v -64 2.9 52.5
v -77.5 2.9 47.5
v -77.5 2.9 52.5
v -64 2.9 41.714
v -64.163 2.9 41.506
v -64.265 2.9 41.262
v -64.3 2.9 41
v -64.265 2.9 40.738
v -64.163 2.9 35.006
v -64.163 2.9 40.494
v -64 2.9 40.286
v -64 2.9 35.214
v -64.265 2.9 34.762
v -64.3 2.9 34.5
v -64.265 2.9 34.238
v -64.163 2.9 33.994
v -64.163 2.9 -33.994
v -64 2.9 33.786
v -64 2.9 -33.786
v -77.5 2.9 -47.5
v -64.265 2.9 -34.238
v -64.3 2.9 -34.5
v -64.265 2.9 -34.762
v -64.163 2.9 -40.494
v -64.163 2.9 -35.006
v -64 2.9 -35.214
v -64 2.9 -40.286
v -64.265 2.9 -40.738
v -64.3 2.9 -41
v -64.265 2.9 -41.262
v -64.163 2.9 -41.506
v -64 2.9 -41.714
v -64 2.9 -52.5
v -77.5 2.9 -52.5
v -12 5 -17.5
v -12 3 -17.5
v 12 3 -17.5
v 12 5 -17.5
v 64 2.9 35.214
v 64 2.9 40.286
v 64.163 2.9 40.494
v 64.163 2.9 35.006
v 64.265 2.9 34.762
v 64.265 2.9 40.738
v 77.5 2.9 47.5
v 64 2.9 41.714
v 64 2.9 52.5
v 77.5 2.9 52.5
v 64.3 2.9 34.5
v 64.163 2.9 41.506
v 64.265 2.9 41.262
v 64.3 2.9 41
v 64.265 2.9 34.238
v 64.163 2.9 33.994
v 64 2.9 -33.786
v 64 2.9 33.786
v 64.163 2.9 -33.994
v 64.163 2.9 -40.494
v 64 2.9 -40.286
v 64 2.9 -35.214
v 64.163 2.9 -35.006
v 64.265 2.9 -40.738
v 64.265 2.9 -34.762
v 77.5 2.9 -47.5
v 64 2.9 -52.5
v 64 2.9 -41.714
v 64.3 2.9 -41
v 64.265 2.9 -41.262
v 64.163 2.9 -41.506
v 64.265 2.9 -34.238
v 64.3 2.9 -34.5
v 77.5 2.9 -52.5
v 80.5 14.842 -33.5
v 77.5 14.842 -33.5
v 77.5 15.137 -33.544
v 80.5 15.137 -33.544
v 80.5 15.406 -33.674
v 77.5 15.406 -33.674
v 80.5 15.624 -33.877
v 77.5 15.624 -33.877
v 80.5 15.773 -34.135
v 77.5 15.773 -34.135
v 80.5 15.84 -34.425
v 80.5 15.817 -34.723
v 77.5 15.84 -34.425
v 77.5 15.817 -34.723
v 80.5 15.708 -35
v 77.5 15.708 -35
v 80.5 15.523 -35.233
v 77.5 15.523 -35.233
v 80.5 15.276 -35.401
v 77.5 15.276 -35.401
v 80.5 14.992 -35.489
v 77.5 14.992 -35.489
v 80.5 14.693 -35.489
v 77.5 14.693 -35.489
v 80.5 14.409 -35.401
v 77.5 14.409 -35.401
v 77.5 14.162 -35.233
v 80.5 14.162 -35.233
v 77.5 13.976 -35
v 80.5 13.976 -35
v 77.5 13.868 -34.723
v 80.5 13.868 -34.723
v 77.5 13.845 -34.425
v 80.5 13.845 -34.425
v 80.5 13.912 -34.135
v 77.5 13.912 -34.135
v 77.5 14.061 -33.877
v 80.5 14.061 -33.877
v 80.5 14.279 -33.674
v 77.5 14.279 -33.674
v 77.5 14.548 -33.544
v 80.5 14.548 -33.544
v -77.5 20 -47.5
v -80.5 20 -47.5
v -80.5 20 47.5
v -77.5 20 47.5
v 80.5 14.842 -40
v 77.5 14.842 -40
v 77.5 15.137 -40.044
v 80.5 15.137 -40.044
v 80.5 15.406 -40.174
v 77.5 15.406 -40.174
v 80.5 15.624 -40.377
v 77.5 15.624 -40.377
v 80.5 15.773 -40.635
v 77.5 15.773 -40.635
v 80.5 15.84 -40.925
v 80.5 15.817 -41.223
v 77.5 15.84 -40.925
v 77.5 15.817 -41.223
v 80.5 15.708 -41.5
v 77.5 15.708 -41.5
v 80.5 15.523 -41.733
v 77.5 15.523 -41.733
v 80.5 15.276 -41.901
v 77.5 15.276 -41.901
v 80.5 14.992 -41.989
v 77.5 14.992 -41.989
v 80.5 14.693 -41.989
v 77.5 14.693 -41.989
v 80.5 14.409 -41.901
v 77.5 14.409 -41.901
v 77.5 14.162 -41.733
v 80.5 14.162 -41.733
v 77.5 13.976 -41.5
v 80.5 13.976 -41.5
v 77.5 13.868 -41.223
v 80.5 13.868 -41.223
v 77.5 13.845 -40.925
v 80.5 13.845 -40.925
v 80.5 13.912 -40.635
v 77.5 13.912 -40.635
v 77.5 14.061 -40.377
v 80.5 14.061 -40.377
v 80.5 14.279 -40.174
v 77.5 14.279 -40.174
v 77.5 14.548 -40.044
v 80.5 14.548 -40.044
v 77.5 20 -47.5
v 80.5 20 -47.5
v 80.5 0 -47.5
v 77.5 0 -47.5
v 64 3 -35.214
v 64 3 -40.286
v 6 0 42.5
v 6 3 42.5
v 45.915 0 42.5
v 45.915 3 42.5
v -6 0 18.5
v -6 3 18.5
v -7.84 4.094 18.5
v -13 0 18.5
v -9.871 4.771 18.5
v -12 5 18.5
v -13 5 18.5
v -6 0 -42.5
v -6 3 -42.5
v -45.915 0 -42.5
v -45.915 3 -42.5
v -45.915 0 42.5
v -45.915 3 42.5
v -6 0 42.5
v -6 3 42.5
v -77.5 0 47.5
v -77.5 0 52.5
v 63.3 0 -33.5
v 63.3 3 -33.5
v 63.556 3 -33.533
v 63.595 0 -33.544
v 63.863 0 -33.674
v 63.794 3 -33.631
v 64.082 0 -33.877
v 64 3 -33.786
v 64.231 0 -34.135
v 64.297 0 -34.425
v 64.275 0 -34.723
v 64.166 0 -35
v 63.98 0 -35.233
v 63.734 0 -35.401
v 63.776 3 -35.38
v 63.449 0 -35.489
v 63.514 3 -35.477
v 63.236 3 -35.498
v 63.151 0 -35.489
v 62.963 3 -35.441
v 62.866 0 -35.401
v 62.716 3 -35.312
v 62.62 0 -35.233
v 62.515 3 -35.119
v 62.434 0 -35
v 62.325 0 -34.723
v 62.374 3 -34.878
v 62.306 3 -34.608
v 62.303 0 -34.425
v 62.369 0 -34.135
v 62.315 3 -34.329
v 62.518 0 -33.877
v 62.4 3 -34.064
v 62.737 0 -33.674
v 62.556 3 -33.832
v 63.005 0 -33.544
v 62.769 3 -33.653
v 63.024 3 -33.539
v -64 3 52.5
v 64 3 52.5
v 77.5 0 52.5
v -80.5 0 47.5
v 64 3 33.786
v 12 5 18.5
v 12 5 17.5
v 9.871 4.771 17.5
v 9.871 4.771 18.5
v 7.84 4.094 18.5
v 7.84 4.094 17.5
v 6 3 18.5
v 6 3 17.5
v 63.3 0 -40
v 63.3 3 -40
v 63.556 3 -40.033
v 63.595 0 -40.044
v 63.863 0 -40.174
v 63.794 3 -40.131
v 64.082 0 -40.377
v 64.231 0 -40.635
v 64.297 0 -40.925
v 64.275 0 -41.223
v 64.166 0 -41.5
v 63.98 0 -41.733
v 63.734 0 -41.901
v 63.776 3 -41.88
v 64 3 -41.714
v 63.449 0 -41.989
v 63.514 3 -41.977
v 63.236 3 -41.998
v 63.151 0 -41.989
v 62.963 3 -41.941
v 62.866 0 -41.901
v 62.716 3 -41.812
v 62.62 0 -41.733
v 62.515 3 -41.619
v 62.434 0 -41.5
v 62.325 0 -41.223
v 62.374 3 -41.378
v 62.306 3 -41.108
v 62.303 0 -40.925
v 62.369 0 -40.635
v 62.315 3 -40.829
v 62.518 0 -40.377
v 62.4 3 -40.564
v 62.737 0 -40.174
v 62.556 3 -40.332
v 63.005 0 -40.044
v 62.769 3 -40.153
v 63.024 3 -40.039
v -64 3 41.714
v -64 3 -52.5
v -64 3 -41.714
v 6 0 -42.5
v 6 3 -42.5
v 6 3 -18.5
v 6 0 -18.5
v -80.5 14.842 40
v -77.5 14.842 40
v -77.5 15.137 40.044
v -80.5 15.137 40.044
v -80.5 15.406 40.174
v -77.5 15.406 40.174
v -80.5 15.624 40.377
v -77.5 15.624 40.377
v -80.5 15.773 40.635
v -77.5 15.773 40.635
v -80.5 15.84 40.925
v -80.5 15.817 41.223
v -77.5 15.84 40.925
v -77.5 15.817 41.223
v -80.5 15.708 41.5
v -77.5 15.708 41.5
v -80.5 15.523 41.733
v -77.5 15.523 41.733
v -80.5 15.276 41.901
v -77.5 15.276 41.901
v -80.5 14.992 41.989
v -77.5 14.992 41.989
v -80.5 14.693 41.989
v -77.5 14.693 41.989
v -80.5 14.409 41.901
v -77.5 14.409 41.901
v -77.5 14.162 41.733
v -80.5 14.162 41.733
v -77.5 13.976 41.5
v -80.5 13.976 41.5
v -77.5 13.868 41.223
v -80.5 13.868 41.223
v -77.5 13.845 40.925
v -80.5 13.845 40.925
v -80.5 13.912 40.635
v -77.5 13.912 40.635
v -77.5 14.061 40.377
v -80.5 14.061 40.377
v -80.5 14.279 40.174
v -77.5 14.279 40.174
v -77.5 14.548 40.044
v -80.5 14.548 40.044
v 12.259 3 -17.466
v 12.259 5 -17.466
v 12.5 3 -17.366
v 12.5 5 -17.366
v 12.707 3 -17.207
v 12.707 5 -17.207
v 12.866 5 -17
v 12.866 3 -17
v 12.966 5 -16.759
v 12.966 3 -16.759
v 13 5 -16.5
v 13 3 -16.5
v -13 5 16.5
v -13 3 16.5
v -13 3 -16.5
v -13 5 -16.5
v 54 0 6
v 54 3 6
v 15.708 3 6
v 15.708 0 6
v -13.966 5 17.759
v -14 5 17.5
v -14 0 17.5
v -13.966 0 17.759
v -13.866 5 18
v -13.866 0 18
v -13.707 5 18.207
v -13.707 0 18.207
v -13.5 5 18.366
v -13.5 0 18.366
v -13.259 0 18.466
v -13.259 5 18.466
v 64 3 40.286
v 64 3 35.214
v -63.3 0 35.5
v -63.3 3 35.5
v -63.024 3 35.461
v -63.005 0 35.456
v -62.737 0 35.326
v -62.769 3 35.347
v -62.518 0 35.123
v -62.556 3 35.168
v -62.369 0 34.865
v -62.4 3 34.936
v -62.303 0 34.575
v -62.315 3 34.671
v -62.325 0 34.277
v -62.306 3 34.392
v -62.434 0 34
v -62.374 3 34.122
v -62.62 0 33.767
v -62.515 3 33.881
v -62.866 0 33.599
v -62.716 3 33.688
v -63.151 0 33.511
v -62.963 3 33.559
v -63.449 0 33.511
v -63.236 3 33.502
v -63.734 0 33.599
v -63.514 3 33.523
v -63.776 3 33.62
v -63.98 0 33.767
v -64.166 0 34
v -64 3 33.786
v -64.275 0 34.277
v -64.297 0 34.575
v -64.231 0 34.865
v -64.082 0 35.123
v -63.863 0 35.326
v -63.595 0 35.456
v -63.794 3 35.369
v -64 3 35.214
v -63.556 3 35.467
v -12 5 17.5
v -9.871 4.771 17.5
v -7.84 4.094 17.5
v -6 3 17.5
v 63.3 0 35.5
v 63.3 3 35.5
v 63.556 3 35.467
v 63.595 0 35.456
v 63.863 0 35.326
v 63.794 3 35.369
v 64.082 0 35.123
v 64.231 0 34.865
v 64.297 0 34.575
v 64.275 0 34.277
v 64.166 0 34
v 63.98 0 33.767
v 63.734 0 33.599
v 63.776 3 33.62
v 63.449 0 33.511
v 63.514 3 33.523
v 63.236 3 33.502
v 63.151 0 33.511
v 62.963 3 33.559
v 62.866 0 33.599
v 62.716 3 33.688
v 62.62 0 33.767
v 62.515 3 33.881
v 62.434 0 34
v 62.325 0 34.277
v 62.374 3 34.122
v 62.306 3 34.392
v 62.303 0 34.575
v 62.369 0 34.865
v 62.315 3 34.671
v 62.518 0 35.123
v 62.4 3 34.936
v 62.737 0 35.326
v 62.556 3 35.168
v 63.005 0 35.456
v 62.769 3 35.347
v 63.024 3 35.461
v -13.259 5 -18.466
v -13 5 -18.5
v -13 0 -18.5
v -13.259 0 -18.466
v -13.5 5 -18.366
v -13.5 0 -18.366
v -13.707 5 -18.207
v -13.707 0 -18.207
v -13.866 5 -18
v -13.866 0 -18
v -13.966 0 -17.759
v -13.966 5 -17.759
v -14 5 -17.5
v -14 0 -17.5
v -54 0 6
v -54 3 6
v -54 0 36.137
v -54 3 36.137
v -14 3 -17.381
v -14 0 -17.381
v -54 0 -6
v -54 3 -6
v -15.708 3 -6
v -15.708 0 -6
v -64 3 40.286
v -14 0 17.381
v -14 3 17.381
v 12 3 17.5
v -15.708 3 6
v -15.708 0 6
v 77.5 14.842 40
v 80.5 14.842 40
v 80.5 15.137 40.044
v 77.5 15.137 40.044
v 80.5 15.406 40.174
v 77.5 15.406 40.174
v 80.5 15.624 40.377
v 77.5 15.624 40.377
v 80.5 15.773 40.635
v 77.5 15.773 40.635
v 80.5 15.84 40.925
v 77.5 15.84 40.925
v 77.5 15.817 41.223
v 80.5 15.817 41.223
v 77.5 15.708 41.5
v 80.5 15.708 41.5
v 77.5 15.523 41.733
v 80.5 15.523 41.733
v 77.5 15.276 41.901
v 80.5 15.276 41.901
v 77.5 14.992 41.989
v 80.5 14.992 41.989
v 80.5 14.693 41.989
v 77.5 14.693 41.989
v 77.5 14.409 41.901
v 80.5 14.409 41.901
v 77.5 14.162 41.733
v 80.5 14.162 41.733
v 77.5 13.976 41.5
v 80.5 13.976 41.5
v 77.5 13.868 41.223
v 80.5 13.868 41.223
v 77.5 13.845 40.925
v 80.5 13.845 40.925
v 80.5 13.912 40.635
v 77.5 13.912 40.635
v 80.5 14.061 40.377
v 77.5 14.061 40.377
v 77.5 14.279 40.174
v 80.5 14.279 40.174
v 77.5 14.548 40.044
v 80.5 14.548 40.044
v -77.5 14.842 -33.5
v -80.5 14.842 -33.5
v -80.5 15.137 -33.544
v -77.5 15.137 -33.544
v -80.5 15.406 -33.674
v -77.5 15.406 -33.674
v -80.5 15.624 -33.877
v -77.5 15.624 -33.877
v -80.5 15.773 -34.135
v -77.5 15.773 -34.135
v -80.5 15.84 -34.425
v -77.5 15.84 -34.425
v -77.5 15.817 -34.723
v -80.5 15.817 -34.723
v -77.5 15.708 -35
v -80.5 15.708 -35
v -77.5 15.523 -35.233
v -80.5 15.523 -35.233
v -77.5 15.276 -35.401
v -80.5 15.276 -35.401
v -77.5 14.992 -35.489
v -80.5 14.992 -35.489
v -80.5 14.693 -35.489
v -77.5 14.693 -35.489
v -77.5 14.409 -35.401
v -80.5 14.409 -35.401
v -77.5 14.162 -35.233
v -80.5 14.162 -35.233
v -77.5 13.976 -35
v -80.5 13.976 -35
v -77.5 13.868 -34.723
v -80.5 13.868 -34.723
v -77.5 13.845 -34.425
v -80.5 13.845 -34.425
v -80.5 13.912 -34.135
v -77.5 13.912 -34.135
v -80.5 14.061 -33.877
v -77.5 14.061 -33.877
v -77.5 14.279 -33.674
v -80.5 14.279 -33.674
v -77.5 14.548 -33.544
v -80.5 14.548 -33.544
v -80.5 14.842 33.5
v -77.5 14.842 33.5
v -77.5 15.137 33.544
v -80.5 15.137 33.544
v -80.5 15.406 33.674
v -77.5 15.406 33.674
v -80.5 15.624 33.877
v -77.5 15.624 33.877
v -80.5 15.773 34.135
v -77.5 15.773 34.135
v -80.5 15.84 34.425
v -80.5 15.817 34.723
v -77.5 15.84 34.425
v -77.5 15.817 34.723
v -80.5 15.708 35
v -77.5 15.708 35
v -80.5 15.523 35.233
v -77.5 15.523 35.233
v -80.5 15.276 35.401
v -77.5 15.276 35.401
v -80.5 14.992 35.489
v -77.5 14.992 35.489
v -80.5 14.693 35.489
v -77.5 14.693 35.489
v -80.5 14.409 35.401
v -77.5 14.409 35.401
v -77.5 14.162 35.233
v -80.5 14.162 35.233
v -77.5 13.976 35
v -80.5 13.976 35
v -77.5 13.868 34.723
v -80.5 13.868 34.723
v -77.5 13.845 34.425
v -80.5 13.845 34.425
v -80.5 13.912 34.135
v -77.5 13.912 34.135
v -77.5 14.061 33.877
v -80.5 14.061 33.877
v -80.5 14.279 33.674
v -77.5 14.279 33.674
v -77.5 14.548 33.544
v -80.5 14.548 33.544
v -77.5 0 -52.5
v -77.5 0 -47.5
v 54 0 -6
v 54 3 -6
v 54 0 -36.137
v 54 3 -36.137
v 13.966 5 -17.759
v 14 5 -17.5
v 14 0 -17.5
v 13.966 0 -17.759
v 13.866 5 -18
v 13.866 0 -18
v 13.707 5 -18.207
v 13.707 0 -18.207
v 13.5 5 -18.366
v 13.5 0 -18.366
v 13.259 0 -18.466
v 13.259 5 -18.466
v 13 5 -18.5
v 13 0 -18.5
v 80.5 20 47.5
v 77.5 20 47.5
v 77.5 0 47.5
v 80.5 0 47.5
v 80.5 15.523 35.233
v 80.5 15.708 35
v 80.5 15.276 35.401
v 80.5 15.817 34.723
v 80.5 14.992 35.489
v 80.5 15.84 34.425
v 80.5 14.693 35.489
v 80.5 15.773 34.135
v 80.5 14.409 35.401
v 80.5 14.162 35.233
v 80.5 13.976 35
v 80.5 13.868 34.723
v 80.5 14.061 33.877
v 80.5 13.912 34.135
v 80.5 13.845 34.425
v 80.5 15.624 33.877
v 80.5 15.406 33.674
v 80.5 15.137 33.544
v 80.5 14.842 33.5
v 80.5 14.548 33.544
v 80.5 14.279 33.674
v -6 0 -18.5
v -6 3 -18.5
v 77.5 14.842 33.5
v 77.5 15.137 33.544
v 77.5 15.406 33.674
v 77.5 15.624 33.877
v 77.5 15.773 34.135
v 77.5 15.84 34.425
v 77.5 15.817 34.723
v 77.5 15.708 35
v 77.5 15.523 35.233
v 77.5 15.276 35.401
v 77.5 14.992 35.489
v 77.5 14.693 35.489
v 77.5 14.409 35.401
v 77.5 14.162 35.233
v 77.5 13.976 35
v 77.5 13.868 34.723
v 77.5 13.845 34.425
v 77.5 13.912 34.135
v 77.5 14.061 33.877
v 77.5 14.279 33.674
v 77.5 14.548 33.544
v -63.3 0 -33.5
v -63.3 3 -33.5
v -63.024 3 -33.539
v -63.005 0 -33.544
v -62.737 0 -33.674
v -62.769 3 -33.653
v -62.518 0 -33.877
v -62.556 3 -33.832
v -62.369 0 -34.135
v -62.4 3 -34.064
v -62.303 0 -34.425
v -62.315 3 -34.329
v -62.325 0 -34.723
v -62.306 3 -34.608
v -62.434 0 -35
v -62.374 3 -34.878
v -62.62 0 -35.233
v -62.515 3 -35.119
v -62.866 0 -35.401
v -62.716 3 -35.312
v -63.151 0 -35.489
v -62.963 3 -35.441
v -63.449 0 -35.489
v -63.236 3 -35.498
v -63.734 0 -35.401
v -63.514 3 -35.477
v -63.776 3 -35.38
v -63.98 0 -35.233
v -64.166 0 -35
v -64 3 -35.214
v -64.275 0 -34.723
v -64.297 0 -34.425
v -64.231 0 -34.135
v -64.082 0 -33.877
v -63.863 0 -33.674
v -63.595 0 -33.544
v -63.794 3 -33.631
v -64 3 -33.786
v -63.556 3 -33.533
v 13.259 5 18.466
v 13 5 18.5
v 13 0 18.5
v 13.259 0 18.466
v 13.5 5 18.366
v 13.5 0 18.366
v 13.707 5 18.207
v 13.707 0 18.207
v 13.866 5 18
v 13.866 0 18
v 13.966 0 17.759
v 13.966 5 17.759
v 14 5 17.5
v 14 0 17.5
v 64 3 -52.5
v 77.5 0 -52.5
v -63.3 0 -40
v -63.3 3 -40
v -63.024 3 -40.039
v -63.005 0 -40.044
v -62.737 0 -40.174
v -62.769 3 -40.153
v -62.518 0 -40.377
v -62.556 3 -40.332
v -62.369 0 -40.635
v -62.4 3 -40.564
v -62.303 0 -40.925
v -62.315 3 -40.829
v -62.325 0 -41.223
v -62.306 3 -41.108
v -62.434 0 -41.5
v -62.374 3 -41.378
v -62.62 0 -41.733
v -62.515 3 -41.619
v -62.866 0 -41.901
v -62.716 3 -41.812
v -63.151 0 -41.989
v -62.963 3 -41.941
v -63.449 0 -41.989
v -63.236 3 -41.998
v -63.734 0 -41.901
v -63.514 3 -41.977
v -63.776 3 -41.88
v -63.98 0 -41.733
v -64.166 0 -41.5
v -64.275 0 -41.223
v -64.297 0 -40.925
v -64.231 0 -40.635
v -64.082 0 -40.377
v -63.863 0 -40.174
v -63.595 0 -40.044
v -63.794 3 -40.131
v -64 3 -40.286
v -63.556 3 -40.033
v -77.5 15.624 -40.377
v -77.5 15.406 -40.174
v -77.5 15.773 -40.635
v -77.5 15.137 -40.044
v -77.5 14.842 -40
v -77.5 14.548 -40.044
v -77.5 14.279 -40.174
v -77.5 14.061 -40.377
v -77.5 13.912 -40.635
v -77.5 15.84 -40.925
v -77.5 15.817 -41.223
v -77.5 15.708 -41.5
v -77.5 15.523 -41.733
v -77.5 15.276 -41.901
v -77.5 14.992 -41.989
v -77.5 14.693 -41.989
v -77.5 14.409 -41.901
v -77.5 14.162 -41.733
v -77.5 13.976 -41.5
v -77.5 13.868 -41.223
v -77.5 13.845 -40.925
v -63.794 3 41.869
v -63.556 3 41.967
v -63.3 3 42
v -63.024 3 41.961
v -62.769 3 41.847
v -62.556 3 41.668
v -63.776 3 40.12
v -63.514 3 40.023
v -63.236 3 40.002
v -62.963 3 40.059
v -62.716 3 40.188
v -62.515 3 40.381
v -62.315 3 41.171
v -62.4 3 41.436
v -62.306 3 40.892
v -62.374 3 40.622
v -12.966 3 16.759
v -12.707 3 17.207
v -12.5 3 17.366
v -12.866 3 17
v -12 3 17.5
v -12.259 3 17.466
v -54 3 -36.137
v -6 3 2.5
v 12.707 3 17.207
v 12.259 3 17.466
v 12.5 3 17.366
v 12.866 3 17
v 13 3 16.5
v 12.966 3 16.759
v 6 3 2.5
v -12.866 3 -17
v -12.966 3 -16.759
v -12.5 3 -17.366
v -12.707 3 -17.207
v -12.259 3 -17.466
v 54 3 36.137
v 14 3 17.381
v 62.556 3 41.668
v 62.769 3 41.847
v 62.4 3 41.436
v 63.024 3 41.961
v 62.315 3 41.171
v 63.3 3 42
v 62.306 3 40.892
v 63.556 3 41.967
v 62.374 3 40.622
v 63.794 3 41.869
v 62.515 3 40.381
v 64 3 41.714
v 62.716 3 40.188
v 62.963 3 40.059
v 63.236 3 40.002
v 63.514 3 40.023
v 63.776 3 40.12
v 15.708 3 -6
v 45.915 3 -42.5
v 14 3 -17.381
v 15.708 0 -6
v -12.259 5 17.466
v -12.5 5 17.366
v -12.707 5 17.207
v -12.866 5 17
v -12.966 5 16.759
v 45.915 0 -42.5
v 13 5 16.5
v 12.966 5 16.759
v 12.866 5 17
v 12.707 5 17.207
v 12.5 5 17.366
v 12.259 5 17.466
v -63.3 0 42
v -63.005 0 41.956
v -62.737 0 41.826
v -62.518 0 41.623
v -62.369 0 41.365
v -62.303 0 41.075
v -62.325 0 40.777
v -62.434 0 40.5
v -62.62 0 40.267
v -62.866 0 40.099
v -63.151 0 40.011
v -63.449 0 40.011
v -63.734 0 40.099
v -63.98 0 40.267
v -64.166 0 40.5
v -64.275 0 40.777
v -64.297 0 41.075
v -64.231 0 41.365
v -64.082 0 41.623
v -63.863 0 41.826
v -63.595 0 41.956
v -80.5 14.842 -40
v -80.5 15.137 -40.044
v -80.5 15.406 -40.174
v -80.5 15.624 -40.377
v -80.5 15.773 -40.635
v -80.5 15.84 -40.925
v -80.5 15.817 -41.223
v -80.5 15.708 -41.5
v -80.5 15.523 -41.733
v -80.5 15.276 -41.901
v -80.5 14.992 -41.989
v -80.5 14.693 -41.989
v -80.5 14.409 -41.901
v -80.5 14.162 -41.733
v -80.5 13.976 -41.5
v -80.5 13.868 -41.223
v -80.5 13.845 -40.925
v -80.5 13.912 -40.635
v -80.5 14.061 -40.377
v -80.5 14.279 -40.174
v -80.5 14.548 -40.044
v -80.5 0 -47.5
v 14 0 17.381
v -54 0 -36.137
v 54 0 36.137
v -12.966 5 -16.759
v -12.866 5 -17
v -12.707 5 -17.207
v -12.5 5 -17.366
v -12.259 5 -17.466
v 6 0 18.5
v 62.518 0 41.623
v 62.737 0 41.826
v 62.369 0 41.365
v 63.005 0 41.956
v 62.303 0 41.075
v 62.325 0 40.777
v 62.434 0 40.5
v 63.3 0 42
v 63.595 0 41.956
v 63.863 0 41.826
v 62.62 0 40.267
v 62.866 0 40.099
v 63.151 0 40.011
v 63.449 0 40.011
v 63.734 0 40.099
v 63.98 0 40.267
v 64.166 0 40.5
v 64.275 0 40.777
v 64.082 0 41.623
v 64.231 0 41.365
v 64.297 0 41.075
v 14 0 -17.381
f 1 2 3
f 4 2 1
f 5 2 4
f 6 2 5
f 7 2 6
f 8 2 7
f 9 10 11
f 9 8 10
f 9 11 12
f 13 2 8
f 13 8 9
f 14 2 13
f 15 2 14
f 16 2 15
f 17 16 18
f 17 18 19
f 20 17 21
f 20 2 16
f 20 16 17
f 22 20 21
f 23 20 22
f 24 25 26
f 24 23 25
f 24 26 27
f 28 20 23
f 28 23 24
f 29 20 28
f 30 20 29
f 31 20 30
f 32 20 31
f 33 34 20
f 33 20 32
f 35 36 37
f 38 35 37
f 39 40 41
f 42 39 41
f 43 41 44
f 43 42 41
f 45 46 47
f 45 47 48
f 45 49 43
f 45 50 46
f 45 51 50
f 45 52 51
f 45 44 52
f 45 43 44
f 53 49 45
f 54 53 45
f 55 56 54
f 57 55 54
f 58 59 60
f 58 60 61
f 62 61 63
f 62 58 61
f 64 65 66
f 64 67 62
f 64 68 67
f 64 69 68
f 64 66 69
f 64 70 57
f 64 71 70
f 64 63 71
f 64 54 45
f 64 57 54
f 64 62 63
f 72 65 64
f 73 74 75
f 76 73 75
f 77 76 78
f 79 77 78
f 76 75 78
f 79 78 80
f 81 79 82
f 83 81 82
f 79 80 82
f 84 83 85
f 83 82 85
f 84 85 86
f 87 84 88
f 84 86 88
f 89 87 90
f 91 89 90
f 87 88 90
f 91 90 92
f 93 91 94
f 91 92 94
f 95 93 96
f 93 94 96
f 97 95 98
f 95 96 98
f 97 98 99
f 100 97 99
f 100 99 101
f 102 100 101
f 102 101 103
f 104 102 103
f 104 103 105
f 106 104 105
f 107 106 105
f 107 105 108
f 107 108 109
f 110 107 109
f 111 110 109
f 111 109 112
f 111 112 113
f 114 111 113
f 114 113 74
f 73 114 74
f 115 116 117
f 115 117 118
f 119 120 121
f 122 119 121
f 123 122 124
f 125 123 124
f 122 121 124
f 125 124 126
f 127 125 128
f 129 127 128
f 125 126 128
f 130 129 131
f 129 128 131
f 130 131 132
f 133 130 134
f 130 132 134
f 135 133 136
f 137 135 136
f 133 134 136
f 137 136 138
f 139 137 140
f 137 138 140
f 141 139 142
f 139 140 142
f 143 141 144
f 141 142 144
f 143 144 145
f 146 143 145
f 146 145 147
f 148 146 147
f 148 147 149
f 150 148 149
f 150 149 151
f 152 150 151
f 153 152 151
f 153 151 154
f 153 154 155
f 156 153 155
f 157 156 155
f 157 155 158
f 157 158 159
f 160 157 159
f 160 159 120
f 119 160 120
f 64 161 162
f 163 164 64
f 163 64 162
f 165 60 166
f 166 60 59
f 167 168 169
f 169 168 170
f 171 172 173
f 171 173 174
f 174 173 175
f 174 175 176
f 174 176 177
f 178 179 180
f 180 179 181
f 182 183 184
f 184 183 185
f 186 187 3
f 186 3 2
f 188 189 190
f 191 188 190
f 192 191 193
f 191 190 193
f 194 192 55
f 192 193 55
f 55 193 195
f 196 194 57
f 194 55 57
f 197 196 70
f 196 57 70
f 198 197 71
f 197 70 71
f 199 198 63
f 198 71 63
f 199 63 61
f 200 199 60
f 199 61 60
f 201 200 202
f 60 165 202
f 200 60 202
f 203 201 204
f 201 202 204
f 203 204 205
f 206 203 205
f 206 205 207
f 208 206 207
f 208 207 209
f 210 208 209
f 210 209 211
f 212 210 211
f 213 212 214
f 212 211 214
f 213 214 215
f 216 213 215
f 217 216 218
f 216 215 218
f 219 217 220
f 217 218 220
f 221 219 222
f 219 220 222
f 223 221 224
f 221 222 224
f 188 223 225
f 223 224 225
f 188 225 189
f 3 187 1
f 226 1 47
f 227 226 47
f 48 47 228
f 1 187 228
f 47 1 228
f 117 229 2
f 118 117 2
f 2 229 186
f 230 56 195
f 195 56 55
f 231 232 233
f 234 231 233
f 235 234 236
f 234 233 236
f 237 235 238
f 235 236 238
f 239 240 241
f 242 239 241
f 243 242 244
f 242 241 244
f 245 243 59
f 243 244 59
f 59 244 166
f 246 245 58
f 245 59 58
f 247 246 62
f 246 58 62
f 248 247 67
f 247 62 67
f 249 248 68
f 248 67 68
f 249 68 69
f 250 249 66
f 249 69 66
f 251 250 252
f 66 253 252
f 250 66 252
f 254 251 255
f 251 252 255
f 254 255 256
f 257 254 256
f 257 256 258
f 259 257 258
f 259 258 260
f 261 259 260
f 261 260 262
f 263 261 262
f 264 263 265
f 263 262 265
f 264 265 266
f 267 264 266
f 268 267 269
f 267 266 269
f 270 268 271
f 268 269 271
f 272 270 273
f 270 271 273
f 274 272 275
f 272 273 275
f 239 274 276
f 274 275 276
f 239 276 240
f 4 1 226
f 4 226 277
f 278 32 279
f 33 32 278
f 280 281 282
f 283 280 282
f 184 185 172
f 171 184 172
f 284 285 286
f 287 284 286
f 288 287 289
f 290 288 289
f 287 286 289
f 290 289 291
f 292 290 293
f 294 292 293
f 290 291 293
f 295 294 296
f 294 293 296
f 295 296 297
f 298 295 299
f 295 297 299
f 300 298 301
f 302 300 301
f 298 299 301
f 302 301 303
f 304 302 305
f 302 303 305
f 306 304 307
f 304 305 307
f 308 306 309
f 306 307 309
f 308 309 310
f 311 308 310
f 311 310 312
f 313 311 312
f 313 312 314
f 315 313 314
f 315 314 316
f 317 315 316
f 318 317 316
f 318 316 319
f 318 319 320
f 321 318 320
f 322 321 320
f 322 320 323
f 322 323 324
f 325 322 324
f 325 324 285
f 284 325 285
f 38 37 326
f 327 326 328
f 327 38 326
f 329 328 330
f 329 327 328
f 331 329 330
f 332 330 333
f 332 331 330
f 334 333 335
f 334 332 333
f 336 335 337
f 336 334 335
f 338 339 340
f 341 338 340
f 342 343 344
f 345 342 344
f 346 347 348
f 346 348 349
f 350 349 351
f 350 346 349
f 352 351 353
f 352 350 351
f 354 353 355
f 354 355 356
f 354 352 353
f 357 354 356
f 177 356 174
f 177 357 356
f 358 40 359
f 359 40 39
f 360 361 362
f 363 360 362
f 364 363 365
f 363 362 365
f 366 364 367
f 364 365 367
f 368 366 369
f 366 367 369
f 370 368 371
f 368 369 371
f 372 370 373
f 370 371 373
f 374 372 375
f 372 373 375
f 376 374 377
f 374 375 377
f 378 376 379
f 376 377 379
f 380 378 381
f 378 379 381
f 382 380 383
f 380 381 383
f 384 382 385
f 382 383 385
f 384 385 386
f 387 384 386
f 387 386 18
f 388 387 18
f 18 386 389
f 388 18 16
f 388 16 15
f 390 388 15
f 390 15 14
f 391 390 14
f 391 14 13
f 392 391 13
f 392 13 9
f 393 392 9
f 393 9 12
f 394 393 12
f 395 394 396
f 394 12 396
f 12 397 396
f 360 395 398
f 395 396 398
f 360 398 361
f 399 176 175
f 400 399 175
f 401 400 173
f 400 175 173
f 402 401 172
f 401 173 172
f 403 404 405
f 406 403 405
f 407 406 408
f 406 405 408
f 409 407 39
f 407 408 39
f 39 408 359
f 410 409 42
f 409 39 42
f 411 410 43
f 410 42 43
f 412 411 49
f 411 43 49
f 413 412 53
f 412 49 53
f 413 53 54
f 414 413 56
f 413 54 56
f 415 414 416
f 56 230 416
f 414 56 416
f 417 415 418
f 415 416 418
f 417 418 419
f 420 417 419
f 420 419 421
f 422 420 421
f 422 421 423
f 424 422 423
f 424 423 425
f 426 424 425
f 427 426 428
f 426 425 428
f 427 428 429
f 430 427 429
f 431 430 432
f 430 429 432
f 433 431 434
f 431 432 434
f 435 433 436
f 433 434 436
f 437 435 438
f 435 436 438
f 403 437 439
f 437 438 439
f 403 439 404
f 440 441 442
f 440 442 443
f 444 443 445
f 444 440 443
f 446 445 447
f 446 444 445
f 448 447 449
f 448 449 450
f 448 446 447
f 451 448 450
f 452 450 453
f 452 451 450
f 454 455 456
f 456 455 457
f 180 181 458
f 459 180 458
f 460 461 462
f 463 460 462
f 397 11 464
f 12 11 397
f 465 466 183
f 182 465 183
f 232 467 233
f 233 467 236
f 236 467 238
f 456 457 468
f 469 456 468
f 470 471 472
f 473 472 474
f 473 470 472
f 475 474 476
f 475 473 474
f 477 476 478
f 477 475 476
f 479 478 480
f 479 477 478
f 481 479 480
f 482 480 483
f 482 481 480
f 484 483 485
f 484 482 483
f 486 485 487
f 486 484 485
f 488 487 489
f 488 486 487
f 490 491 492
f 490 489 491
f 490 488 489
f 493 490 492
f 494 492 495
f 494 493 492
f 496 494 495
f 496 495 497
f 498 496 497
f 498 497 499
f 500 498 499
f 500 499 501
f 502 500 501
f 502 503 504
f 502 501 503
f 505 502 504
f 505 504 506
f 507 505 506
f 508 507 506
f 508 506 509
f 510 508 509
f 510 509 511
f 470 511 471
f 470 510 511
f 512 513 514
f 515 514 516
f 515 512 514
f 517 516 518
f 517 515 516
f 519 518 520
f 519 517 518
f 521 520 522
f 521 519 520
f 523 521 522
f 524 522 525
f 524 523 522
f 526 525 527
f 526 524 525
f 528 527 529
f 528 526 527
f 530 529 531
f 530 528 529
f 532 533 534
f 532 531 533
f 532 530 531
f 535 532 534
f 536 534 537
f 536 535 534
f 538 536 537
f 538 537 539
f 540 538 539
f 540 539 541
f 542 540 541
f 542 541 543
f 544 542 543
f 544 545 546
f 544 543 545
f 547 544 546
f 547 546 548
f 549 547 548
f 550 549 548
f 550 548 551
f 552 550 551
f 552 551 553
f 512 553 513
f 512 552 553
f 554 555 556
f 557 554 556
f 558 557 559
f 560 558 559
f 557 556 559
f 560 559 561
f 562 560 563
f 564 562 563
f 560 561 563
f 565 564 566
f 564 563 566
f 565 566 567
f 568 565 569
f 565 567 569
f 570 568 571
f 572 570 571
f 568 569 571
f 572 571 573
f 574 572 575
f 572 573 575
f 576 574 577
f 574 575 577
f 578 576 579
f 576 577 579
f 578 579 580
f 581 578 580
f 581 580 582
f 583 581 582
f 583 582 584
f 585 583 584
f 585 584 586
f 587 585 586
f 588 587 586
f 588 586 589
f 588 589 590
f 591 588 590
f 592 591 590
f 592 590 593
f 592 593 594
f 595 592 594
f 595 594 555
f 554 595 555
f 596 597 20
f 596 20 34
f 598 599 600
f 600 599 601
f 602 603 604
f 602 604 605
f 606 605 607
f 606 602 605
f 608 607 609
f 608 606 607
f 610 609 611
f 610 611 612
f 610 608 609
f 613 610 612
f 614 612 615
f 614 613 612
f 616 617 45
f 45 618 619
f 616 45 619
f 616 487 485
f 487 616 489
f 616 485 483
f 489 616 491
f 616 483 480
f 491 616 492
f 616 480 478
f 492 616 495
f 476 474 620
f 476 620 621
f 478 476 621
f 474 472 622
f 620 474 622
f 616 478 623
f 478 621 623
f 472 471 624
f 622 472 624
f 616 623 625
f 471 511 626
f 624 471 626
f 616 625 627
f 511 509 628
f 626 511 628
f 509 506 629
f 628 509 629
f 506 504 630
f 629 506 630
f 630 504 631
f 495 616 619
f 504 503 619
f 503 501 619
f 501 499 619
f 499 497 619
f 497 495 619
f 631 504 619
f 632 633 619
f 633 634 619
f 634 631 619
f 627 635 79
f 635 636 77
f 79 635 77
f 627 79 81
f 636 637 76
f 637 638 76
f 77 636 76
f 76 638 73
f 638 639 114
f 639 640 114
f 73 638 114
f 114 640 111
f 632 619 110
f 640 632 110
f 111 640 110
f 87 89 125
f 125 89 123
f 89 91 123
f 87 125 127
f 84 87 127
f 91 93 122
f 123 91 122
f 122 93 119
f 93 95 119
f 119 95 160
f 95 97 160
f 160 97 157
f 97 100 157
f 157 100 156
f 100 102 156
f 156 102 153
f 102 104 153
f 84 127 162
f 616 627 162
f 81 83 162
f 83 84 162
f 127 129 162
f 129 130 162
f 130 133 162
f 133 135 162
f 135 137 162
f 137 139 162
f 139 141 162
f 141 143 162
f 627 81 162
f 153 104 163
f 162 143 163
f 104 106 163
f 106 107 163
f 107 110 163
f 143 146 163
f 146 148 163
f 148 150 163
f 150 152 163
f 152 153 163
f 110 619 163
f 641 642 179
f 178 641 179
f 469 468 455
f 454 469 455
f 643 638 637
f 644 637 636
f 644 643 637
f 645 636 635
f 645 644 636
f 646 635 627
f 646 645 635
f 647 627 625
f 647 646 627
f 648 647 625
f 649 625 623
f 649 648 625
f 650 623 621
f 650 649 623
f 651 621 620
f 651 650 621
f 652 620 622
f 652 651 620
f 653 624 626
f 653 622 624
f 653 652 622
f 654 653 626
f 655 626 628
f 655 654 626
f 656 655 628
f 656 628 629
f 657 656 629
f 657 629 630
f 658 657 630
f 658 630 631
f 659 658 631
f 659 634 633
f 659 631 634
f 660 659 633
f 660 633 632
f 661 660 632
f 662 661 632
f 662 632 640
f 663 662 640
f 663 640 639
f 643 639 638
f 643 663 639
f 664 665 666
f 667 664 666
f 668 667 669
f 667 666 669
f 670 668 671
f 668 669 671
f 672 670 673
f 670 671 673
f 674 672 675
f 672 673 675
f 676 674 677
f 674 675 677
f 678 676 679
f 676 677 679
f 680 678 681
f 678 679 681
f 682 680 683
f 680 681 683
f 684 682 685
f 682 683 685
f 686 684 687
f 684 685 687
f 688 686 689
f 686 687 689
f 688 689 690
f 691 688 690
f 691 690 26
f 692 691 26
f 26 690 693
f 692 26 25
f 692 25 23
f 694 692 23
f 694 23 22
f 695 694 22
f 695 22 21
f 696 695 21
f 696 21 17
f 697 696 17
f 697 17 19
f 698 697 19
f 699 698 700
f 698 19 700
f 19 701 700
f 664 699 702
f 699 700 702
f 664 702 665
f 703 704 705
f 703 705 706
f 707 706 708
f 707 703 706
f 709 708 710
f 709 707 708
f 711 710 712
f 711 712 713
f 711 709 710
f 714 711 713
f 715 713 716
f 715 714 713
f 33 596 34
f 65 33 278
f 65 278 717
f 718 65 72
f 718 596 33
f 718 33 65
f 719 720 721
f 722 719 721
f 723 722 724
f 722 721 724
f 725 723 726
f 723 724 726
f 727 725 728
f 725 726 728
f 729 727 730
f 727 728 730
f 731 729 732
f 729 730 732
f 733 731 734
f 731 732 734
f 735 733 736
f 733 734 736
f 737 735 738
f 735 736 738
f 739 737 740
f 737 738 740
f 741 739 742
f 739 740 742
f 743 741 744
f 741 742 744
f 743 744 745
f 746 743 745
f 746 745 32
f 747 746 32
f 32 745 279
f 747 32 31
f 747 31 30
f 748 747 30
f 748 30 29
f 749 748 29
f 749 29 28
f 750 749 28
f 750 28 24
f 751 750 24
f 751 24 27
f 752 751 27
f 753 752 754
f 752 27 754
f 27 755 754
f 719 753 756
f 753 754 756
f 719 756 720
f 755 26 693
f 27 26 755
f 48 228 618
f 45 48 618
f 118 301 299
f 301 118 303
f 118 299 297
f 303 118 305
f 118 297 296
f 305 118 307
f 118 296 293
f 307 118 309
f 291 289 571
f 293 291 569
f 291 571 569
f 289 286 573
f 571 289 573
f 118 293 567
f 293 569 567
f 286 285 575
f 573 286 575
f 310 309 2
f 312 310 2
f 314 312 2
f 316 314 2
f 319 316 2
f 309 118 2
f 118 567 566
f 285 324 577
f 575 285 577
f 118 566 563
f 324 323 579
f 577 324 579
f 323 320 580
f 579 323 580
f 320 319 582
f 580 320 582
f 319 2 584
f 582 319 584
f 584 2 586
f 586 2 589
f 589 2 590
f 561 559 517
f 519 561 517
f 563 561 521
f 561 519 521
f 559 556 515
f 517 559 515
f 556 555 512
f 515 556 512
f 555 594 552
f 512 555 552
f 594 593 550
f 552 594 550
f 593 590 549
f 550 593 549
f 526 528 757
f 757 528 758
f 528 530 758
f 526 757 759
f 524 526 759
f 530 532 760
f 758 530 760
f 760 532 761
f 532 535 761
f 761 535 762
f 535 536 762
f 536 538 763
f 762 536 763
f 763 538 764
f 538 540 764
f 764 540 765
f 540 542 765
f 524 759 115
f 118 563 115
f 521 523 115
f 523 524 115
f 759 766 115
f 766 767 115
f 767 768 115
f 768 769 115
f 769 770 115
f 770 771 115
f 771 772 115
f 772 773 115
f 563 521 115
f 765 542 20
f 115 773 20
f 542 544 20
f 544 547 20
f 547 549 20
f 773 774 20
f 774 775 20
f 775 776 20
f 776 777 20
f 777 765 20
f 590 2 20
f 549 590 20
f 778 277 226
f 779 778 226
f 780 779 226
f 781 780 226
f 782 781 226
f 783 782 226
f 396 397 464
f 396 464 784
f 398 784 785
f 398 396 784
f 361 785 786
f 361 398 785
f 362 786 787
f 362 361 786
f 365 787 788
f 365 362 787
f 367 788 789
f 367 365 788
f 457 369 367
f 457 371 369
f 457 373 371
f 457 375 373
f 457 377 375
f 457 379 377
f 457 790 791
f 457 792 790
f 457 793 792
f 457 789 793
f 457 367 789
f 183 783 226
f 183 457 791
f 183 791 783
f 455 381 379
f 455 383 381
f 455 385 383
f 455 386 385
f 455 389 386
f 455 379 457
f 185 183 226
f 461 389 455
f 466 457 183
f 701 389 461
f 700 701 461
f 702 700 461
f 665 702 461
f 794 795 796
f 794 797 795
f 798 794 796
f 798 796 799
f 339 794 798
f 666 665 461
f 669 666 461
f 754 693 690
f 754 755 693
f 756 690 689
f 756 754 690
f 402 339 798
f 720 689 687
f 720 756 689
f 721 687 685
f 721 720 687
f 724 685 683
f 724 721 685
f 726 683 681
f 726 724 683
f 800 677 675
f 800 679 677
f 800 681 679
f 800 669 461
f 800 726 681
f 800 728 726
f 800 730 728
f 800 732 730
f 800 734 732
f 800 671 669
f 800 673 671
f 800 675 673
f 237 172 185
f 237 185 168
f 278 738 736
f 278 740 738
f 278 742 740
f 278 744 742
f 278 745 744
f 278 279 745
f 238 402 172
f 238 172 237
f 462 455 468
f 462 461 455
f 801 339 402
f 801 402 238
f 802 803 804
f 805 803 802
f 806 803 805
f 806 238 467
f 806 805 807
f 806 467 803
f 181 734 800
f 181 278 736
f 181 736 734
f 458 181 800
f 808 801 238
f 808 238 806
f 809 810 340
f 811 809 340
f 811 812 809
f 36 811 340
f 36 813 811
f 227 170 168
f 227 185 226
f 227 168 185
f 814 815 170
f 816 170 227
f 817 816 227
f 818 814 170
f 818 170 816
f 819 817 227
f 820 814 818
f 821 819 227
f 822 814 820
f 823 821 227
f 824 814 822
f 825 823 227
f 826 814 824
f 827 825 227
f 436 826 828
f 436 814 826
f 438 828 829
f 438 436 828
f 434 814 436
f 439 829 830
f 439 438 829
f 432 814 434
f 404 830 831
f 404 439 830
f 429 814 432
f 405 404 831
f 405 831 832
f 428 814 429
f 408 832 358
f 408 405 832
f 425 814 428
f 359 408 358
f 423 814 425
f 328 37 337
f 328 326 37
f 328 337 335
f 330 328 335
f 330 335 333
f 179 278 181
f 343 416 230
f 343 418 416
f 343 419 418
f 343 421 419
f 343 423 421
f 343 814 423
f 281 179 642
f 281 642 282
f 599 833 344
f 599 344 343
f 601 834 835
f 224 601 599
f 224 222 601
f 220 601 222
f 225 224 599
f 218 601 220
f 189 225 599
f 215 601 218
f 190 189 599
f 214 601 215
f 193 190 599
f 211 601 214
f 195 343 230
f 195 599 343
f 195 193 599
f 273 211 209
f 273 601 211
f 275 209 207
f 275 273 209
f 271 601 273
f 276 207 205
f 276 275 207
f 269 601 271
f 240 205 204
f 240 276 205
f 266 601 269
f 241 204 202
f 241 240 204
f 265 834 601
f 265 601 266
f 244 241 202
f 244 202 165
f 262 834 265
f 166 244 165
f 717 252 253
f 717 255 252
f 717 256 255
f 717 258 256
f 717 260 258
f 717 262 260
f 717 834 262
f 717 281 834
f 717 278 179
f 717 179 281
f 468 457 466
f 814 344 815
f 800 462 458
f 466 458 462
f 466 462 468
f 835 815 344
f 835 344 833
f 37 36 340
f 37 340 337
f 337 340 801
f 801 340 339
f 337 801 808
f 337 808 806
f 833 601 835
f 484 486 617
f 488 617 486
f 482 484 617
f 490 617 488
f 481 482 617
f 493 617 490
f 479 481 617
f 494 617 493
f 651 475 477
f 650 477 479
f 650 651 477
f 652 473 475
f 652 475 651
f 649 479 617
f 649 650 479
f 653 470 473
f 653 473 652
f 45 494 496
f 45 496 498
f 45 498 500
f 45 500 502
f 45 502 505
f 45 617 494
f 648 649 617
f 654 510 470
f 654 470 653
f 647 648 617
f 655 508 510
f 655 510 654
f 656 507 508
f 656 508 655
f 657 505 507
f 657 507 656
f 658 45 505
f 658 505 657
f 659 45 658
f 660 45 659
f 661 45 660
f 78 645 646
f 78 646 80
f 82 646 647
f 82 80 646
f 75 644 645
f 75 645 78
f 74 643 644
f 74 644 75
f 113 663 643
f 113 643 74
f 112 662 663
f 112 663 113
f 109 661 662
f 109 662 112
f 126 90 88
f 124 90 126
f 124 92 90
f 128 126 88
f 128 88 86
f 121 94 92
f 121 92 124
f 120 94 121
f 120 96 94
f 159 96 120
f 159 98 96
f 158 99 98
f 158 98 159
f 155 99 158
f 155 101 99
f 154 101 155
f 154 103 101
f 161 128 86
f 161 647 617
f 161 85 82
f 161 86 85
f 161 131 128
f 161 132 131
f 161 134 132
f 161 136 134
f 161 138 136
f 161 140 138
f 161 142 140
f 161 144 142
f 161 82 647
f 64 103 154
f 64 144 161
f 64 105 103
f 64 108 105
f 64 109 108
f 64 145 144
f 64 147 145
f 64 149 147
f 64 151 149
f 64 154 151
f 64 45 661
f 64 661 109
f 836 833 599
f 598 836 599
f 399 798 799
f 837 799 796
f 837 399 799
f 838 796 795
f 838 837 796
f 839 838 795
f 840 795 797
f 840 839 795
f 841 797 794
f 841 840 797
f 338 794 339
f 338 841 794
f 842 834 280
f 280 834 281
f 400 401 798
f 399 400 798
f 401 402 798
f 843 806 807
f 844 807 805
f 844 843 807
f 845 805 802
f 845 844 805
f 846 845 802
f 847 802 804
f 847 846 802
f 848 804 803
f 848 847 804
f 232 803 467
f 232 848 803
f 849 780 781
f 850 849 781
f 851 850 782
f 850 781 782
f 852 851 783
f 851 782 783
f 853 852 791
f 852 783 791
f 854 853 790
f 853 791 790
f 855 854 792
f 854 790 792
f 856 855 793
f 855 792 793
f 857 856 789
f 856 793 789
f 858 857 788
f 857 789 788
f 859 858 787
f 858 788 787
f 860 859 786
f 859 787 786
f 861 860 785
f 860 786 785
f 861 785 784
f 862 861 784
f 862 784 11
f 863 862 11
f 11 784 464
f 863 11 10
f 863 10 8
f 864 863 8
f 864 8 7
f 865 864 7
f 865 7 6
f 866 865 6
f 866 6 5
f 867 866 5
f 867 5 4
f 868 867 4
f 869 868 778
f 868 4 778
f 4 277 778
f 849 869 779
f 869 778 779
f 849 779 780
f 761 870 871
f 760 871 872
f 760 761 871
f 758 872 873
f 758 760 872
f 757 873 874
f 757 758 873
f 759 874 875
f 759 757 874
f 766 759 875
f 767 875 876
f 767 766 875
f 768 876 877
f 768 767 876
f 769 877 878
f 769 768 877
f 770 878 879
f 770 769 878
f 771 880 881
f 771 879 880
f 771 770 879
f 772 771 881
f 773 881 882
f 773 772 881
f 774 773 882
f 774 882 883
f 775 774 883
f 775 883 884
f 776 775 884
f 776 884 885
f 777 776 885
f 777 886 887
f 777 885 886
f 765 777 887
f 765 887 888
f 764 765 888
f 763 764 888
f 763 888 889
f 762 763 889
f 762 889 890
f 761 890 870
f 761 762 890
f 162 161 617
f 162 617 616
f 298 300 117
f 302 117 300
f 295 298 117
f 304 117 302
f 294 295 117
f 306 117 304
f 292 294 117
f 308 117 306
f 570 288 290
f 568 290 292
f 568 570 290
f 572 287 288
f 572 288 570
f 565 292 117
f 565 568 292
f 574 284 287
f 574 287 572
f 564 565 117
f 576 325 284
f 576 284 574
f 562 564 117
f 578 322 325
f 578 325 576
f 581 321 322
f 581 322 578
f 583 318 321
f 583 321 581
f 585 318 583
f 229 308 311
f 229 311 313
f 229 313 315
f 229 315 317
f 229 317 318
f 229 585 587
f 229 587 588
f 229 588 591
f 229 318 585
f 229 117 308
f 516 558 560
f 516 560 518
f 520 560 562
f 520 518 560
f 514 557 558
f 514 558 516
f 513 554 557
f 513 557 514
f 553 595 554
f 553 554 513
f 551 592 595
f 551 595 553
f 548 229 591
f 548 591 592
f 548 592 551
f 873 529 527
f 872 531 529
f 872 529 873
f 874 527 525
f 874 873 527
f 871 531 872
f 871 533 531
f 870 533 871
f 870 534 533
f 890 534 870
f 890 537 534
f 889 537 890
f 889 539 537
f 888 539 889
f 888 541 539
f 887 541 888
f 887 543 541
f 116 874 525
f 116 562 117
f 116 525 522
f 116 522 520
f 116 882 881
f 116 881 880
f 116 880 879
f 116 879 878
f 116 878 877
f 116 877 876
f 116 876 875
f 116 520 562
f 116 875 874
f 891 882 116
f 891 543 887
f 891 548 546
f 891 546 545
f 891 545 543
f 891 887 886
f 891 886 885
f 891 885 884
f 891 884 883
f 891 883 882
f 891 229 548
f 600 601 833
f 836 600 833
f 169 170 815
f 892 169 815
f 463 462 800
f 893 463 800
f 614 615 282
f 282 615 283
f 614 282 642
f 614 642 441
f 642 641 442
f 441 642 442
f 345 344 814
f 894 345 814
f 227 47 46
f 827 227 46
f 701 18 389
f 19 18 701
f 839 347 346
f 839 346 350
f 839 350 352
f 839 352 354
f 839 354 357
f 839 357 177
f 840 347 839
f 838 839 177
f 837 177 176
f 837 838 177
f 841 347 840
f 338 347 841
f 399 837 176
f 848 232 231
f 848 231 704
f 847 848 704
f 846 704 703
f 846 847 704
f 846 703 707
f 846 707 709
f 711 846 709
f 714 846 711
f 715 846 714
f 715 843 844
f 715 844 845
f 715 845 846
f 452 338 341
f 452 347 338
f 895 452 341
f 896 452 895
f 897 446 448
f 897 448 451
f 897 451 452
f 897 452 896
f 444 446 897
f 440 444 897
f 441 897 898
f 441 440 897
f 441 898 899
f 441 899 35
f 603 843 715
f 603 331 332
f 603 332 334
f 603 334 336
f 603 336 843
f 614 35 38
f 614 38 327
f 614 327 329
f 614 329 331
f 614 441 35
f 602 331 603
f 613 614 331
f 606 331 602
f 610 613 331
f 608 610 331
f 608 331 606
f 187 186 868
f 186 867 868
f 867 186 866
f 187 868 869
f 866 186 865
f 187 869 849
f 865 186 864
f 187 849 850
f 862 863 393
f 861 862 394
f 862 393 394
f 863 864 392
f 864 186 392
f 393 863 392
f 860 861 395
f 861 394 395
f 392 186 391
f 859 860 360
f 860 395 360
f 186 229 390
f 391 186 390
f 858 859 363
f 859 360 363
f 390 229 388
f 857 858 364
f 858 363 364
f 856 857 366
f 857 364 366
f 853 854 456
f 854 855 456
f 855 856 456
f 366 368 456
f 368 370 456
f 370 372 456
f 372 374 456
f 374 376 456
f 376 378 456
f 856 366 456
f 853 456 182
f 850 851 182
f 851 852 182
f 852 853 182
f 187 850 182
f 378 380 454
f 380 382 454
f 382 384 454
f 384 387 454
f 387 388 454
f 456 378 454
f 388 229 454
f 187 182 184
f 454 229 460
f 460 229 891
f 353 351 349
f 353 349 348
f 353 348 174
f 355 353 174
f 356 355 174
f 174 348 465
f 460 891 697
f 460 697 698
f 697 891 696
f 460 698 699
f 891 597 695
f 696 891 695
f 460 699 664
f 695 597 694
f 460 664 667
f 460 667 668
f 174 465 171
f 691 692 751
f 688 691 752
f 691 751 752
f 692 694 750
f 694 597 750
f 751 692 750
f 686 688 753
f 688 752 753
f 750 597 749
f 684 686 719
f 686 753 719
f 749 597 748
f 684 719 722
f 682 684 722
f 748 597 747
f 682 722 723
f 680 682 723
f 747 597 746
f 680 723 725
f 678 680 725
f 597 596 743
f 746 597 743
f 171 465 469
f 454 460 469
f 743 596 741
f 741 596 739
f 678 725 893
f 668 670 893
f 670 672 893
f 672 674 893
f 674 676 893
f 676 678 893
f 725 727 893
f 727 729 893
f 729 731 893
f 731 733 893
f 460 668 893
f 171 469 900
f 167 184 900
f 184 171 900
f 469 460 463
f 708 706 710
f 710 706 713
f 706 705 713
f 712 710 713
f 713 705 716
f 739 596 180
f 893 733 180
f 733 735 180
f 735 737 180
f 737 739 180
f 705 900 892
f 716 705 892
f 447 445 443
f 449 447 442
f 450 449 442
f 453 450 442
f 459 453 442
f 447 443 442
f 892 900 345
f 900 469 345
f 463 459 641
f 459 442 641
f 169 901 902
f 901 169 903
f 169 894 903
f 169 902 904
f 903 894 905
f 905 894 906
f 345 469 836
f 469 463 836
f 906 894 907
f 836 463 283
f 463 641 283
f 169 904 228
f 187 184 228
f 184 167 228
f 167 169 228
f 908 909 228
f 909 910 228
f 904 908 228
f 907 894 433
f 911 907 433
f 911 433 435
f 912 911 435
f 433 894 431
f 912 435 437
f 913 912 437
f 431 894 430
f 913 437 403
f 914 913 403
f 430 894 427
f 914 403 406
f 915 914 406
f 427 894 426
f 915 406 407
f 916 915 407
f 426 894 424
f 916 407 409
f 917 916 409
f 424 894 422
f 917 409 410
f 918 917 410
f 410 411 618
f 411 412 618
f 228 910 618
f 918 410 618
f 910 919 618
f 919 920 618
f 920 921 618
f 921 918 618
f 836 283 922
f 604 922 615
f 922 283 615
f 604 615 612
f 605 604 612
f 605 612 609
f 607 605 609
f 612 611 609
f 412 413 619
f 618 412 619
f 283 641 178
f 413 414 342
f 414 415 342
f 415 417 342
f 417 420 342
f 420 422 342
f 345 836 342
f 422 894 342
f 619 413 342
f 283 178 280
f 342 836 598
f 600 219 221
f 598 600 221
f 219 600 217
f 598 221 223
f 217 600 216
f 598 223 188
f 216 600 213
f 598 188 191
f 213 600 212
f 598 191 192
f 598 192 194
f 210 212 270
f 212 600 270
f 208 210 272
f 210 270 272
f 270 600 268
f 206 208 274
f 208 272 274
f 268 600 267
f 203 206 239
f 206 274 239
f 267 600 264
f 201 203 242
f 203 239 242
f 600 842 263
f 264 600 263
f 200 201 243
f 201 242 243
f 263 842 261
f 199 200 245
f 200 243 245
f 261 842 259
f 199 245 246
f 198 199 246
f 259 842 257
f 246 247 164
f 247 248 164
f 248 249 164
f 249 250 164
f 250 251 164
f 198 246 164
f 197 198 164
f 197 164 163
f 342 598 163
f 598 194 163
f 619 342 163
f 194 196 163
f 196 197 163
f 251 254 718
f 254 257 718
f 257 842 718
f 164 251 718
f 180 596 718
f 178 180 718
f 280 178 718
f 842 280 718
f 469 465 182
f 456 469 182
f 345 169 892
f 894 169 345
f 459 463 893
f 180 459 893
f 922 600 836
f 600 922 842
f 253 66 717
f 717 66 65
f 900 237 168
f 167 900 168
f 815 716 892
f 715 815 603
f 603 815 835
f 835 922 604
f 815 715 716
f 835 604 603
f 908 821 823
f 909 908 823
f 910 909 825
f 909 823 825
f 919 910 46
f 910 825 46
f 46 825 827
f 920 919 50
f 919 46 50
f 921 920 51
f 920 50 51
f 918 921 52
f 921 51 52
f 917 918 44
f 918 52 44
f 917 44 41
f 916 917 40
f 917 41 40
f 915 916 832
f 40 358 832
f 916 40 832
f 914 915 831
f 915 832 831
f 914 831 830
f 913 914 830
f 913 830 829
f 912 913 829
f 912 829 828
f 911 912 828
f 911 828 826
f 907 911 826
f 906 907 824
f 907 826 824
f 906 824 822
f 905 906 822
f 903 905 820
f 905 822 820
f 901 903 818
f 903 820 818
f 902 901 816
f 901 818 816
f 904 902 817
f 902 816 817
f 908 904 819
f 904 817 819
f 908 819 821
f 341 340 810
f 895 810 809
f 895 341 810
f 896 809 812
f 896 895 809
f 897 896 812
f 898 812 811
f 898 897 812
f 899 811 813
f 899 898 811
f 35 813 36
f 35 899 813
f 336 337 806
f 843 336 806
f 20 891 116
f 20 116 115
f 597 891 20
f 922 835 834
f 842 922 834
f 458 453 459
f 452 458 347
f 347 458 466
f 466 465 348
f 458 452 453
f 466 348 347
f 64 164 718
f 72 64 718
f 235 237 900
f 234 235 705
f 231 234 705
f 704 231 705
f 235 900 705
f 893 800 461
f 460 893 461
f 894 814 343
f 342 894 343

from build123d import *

# Parameters (mm, degrees)
SKETCH1_W                                  = 128
SKETCH1_H                                  = 105
BOSS_EXTRUDE1_DEPTH                        = 3
SKETCH2_W                                  = 13.5
SKETCH2_H                                  = 105
BOSS_EXTRUDE2_DEPTH                        = 2.9
BOSS_EXTRUDE9_DEPTH                        = 7
FILLET2_R                                  = 1
CUT_EXTRUDE1_DEPTH                         = 7
SKETCH3_W                                  = 3
SKETCH3_H                                  = 95
BOSS_EXTRUDE10_DEPTH                       = 20
SKETCH11_R                                 = 1
CUT_EXTRUDE2_DEPTH                         = 20
SKETCH13_R                                 = 1
CUT_EXTRUDE3_DEPTH                         = 20
MIRROR1_AT_THE_SECOND_PLANE_COPY_1_SKETC_R = 1
MIRROR1_AT_THE_SECOND_PLANE_COPY_1_DEPTH   = 20
CUT_EXTRUDE8_DEPTH                         = 5
FILLET3_R                                  = 10


with BuildPart() as part:
    # Sketch1 → Boss-Extrude1 (new body)
    with BuildSketch(Plane(origin=(0, 0, 0), x_dir=(1, 0, 0), z_dir=(0, 1, 0))):
        Rectangle(SKETCH1_W, SKETCH1_H)
    extrude(amount=BOSS_EXTRUDE1_DEPTH)

    # Sketch2 → Boss-Extrude2 (add)
    with BuildSketch(Plane(origin=(0, 0, 0), x_dir=(1, 0, 0), z_dir=(0, 1, 0))):
        with Locations((-70.75, 0)):
            Rectangle(SKETCH2_W, SKETCH2_H)
        with Locations((70.75, 0)):
            Rectangle(SKETCH2_W, SKETCH2_H)
    extrude(amount=BOSS_EXTRUDE2_DEPTH)

    # Sketch5 → Boss-Extrude9 (add)
    with BuildSketch(Plane(origin=(0, 3, 0), x_dir=(1, 0, 0), z_dir=(0, 1, 0))):
        Polygon((-6, -18.5), (-6, -17.5), (-13, -17.5), (-13, 17.5), (13, 17.5), (13, -17.5), (6, -17.5), (6, -18.5), (14, -18.5), (14, 18.5), (-14, 18.5), (-14, -18.5), align=None)
    extrude(amount=BOSS_EXTRUDE9_DEPTH)

    # Fillet2
    fillet2_edges = [part.edges().sort_by_distance(p)[0] for p in [
        (13, 6.5, 17.5),
        (14, 6.5, 18.5),
        (14, 6.5, -18.5),
        (-14, 6.5, -18.5),
        (-14, 6.5, 18.5),
        (-13, 6.5, 17.5),
        (-13, 6.5, -17.5),
        (13, 6.5, -17.5),
    ]]
    fillet(fillet2_edges, radius=FILLET2_R)

    # Sketch10 → Cut-Extrude1 (cut)
    with BuildSketch(Plane(origin=(0, 3, 0), x_dir=(1, 0, 0), z_dir=(0, 1, 0))):
        with BuildLine():
            Line((-14, -17.381354556), (-45.915455387, -42.5))
            Line((-45.915455387, -42.5), (-6, -42.5))
            Line((-6, -42.5), (-6, -18.5))
            Line((-6, -18.5), (-13, -18.5))
            ThreePointArc((-13, -18.5), (-13.707106781, -18.207106781), (-14, -17.5))
            Line((-14, -17.5), (-14, -17.381354556))
        make_face()
        Polygon((-54, -6), (-54, -36.137163962), (-15.708074024, -6), align=None)
        with BuildLine():
            Line((6, -18.5), (6, -42.5))
            Line((6, -42.5), (45.915455387, -42.5))
            Line((45.915455387, -42.5), (14, -17.381354556))
            Line((14, -17.381354556), (14, -17.5))
            ThreePointArc((14, -17.5), (13.707106781, -18.207106781), (13, -18.5))
            Line((13, -18.5), (6, -18.5))
        make_face()
        Polygon((-54, 36.137163962), (-54, 6), (-15.708074024, 6), align=None)
        Polygon((15.708074024, -6), (54, -36.137163962), (54, -6), align=None)
        with BuildLine():
            Line((-6, 42.5), (-45.915455387, 42.5))
            Line((-45.915455387, 42.5), (-14, 17.381354556))
            Line((-14, 17.381354556), (-14, 17.5))
            ThreePointArc((-14, 17.5), (-13.707106781, 18.207106781), (-13, 18.5))
            Line((-13, 18.5), (-6, 18.5))
            Line((-6, 18.5), (-6, 42.5))
        make_face()
        Polygon((15.708074024, 6), (54, 6), (54, 36.137163962), align=None)
        with BuildLine():
            Line((45.915455387, 42.5), (6, 42.5))
            Line((6, 42.5), (6, 18.5))
            Line((6, 18.5), (13, 18.5))
            ThreePointArc((13, 18.5), (13.707106781, 18.207106781), (14, 17.5))
            Line((14, 17.5), (14, 17.381354556))
            Line((14, 17.381354556), (45.915455387, 42.5))
        make_face()
    extrude(amount=-CUT_EXTRUDE1_DEPTH, mode=Mode.SUBTRACT)

    # Sketch3 → Boss-Extrude10 (add)
    with BuildSketch(Plane(origin=(0, 0, 0), x_dir=(1, 0, 0), z_dir=(0, 1, 0))):
        with Locations((-79, 0)):
            Rectangle(SKETCH3_W, SKETCH3_H)
        with Locations((79, 0)):
            Rectangle(SKETCH3_W, SKETCH3_H)
    extrude(amount=BOSS_EXTRUDE10_DEPTH)

    # Sketch11 → Cut-Extrude2 (cut)
    with BuildSketch(Plane(origin=(0, 3, 0), x_dir=(1, 0, 0), z_dir=(0, 1, 0))):
        with Locations(Location((-63.3, -41, 0), (0, 0, 270))):
            Circle(SKETCH11_R)
        with Locations(Location((-63.3, -34.5, 0), (0, 0, 270))):
            Circle(SKETCH11_R)
        with Locations(Location((-63.3, 34.5, 0), (0, 0, 270))):
            Circle(SKETCH11_R)
        with Locations(Location((-63.3, 41, 0), (0, 0, 270))):
            Circle(SKETCH11_R)
        with Locations(Location((63.3, 41, 0), (0, 0, 270))):
            Circle(SKETCH11_R)
        with Locations(Location((63.3, 34.5, 0), (0, 0, 270))):
            Circle(SKETCH11_R)
        with Locations(Location((63.3, -34.5, 0), (0, 0, 270))):
            Circle(SKETCH11_R)
        with Locations(Location((63.3, -41, 0), (0, 0, 270))):
            Circle(SKETCH11_R)
    extrude(amount=-CUT_EXTRUDE2_DEPTH, mode=Mode.SUBTRACT)

    # Sketch13 → Cut-Extrude3 (cut)
    with BuildSketch(Plane(origin=(-77.5, 0, 0), x_dir=(0, 0, -1), z_dir=(1, 0, 0))):
        with Locations((-41, 14.842473729)):
            Circle(SKETCH13_R)
        with Locations((-34.5, 14.842473729)):
            Circle(SKETCH13_R)
    cut_extrude3 = extrude(amount=-CUT_EXTRUDE3_DEPTH, mode=Mode.SUBTRACT)

    # Mirror1: Cut-Extrude3 across plane
    add(cut_extrude3.mirror(Plane.XY), mode=Mode.SUBTRACT)

    # Mirror1 at the second plane: Cut-Extrude3 across plane
    add(cut_extrude3.mirror(Plane(origin=(0, 0, 0), x_dir=(0, 0, 1), z_dir=(1, 0, 0))), mode=Mode.SUBTRACT)

    # Mirror1 at the second plane copy 1 sketc → Mirror1 at the second plane copy 1 (cut)
    with BuildSketch(Plane.ZY.offset(-77.5)):
        with Locations((-41, 14.842473729)):
            Circle(MIRROR1_AT_THE_SECOND_PLANE_COPY_1_SKETC_R)
        with Locations((-34.5, 14.842473729)):
            Circle(MIRROR1_AT_THE_SECOND_PLANE_COPY_1_SKETC_R)
    extrude(amount=-MIRROR1_AT_THE_SECOND_PLANE_COPY_1_DEPTH, mode=Mode.SUBTRACT)

    # Sketch22 → Cut-Extrude8 (cut)
    with BuildSketch(Plane(origin=(0, 10, 0), x_dir=(1, 0, 0), z_dir=(0, 1, 0))):
        with BuildLine():
            Line((14, -17.5), (14, 17.5))
            ThreePointArc((14, 17.5), (13.707106781, 18.207106781), (13, 18.5))
            Line((13, 18.5), (-13, 18.5))
            ThreePointArc((-13, 18.5), (-13.707106781, 18.207106781), (-14, 17.5))
            Line((-14, 17.5), (-14, -17.5))
            ThreePointArc((-14, -17.5), (-13.707106781, -18.207106781), (-13, -18.5))
            Line((-13, -18.5), (-6, -18.5))
            Line((-6, -18.5), (-6, -17.5))
            Line((-6, -17.5), (-12, -17.5))
            ThreePointArc((-12, -17.5), (-12.707106781, -17.207106781), (-13, -16.5))
            Line((-13, -16.5), (-13, 16.5))
            ThreePointArc((-13, 16.5), (-12.707106781, 17.207106781), (-12, 17.5))
            Line((-12, 17.5), (12, 17.5))
            ThreePointArc((12, 17.5), (12.707106781, 17.207106781), (13, 16.5))
            Line((13, 16.5), (13, -16.5))
            ThreePointArc((13, -16.5), (12.707106781, -17.207106781), (12, -17.5))
            Line((12, -17.5), (6, -17.5))
            Line((6, -17.5), (6, -18.5))
            Line((6, -18.5), (13, -18.5))
            ThreePointArc((13, -18.5), (13.707106781, -18.207106781), (14, -17.5))
        make_face()
    extrude(amount=-CUT_EXTRUDE8_DEPTH, mode=Mode.SUBTRACT)

    # Fillet3
    # the kernel refuses this fillet: 10 mm, written as the material it takes off along each edge
    with BuildSketch(Plane(origin=(6, 5, 2.5), x_dir=(0, -1, 0), z_dir=(0, 0, 1)), Plane(origin=(-6, 5, 33.5), x_dir=(0, -1, 0), z_dir=(0, 0, -1))) as fillet3_piece_1:
        with BuildLine():
            CenterArc((10, 6), FILLET3_R, 180, 36.869897646)
            Line((0, 6), (-0.2, 6))
            Line((-0.2, 6), (-0.2, 0))
            Line((-0.2, 0), (0, -0.2))
            ThreePointArc((0, -0.2), (1, -0.2), (1.84, -0.12))
            Line((1.84, -0.12), (2, 0))
        make_face()
    extrude(amount=31, mode=Mode.SUBTRACT)


solid = part.part
